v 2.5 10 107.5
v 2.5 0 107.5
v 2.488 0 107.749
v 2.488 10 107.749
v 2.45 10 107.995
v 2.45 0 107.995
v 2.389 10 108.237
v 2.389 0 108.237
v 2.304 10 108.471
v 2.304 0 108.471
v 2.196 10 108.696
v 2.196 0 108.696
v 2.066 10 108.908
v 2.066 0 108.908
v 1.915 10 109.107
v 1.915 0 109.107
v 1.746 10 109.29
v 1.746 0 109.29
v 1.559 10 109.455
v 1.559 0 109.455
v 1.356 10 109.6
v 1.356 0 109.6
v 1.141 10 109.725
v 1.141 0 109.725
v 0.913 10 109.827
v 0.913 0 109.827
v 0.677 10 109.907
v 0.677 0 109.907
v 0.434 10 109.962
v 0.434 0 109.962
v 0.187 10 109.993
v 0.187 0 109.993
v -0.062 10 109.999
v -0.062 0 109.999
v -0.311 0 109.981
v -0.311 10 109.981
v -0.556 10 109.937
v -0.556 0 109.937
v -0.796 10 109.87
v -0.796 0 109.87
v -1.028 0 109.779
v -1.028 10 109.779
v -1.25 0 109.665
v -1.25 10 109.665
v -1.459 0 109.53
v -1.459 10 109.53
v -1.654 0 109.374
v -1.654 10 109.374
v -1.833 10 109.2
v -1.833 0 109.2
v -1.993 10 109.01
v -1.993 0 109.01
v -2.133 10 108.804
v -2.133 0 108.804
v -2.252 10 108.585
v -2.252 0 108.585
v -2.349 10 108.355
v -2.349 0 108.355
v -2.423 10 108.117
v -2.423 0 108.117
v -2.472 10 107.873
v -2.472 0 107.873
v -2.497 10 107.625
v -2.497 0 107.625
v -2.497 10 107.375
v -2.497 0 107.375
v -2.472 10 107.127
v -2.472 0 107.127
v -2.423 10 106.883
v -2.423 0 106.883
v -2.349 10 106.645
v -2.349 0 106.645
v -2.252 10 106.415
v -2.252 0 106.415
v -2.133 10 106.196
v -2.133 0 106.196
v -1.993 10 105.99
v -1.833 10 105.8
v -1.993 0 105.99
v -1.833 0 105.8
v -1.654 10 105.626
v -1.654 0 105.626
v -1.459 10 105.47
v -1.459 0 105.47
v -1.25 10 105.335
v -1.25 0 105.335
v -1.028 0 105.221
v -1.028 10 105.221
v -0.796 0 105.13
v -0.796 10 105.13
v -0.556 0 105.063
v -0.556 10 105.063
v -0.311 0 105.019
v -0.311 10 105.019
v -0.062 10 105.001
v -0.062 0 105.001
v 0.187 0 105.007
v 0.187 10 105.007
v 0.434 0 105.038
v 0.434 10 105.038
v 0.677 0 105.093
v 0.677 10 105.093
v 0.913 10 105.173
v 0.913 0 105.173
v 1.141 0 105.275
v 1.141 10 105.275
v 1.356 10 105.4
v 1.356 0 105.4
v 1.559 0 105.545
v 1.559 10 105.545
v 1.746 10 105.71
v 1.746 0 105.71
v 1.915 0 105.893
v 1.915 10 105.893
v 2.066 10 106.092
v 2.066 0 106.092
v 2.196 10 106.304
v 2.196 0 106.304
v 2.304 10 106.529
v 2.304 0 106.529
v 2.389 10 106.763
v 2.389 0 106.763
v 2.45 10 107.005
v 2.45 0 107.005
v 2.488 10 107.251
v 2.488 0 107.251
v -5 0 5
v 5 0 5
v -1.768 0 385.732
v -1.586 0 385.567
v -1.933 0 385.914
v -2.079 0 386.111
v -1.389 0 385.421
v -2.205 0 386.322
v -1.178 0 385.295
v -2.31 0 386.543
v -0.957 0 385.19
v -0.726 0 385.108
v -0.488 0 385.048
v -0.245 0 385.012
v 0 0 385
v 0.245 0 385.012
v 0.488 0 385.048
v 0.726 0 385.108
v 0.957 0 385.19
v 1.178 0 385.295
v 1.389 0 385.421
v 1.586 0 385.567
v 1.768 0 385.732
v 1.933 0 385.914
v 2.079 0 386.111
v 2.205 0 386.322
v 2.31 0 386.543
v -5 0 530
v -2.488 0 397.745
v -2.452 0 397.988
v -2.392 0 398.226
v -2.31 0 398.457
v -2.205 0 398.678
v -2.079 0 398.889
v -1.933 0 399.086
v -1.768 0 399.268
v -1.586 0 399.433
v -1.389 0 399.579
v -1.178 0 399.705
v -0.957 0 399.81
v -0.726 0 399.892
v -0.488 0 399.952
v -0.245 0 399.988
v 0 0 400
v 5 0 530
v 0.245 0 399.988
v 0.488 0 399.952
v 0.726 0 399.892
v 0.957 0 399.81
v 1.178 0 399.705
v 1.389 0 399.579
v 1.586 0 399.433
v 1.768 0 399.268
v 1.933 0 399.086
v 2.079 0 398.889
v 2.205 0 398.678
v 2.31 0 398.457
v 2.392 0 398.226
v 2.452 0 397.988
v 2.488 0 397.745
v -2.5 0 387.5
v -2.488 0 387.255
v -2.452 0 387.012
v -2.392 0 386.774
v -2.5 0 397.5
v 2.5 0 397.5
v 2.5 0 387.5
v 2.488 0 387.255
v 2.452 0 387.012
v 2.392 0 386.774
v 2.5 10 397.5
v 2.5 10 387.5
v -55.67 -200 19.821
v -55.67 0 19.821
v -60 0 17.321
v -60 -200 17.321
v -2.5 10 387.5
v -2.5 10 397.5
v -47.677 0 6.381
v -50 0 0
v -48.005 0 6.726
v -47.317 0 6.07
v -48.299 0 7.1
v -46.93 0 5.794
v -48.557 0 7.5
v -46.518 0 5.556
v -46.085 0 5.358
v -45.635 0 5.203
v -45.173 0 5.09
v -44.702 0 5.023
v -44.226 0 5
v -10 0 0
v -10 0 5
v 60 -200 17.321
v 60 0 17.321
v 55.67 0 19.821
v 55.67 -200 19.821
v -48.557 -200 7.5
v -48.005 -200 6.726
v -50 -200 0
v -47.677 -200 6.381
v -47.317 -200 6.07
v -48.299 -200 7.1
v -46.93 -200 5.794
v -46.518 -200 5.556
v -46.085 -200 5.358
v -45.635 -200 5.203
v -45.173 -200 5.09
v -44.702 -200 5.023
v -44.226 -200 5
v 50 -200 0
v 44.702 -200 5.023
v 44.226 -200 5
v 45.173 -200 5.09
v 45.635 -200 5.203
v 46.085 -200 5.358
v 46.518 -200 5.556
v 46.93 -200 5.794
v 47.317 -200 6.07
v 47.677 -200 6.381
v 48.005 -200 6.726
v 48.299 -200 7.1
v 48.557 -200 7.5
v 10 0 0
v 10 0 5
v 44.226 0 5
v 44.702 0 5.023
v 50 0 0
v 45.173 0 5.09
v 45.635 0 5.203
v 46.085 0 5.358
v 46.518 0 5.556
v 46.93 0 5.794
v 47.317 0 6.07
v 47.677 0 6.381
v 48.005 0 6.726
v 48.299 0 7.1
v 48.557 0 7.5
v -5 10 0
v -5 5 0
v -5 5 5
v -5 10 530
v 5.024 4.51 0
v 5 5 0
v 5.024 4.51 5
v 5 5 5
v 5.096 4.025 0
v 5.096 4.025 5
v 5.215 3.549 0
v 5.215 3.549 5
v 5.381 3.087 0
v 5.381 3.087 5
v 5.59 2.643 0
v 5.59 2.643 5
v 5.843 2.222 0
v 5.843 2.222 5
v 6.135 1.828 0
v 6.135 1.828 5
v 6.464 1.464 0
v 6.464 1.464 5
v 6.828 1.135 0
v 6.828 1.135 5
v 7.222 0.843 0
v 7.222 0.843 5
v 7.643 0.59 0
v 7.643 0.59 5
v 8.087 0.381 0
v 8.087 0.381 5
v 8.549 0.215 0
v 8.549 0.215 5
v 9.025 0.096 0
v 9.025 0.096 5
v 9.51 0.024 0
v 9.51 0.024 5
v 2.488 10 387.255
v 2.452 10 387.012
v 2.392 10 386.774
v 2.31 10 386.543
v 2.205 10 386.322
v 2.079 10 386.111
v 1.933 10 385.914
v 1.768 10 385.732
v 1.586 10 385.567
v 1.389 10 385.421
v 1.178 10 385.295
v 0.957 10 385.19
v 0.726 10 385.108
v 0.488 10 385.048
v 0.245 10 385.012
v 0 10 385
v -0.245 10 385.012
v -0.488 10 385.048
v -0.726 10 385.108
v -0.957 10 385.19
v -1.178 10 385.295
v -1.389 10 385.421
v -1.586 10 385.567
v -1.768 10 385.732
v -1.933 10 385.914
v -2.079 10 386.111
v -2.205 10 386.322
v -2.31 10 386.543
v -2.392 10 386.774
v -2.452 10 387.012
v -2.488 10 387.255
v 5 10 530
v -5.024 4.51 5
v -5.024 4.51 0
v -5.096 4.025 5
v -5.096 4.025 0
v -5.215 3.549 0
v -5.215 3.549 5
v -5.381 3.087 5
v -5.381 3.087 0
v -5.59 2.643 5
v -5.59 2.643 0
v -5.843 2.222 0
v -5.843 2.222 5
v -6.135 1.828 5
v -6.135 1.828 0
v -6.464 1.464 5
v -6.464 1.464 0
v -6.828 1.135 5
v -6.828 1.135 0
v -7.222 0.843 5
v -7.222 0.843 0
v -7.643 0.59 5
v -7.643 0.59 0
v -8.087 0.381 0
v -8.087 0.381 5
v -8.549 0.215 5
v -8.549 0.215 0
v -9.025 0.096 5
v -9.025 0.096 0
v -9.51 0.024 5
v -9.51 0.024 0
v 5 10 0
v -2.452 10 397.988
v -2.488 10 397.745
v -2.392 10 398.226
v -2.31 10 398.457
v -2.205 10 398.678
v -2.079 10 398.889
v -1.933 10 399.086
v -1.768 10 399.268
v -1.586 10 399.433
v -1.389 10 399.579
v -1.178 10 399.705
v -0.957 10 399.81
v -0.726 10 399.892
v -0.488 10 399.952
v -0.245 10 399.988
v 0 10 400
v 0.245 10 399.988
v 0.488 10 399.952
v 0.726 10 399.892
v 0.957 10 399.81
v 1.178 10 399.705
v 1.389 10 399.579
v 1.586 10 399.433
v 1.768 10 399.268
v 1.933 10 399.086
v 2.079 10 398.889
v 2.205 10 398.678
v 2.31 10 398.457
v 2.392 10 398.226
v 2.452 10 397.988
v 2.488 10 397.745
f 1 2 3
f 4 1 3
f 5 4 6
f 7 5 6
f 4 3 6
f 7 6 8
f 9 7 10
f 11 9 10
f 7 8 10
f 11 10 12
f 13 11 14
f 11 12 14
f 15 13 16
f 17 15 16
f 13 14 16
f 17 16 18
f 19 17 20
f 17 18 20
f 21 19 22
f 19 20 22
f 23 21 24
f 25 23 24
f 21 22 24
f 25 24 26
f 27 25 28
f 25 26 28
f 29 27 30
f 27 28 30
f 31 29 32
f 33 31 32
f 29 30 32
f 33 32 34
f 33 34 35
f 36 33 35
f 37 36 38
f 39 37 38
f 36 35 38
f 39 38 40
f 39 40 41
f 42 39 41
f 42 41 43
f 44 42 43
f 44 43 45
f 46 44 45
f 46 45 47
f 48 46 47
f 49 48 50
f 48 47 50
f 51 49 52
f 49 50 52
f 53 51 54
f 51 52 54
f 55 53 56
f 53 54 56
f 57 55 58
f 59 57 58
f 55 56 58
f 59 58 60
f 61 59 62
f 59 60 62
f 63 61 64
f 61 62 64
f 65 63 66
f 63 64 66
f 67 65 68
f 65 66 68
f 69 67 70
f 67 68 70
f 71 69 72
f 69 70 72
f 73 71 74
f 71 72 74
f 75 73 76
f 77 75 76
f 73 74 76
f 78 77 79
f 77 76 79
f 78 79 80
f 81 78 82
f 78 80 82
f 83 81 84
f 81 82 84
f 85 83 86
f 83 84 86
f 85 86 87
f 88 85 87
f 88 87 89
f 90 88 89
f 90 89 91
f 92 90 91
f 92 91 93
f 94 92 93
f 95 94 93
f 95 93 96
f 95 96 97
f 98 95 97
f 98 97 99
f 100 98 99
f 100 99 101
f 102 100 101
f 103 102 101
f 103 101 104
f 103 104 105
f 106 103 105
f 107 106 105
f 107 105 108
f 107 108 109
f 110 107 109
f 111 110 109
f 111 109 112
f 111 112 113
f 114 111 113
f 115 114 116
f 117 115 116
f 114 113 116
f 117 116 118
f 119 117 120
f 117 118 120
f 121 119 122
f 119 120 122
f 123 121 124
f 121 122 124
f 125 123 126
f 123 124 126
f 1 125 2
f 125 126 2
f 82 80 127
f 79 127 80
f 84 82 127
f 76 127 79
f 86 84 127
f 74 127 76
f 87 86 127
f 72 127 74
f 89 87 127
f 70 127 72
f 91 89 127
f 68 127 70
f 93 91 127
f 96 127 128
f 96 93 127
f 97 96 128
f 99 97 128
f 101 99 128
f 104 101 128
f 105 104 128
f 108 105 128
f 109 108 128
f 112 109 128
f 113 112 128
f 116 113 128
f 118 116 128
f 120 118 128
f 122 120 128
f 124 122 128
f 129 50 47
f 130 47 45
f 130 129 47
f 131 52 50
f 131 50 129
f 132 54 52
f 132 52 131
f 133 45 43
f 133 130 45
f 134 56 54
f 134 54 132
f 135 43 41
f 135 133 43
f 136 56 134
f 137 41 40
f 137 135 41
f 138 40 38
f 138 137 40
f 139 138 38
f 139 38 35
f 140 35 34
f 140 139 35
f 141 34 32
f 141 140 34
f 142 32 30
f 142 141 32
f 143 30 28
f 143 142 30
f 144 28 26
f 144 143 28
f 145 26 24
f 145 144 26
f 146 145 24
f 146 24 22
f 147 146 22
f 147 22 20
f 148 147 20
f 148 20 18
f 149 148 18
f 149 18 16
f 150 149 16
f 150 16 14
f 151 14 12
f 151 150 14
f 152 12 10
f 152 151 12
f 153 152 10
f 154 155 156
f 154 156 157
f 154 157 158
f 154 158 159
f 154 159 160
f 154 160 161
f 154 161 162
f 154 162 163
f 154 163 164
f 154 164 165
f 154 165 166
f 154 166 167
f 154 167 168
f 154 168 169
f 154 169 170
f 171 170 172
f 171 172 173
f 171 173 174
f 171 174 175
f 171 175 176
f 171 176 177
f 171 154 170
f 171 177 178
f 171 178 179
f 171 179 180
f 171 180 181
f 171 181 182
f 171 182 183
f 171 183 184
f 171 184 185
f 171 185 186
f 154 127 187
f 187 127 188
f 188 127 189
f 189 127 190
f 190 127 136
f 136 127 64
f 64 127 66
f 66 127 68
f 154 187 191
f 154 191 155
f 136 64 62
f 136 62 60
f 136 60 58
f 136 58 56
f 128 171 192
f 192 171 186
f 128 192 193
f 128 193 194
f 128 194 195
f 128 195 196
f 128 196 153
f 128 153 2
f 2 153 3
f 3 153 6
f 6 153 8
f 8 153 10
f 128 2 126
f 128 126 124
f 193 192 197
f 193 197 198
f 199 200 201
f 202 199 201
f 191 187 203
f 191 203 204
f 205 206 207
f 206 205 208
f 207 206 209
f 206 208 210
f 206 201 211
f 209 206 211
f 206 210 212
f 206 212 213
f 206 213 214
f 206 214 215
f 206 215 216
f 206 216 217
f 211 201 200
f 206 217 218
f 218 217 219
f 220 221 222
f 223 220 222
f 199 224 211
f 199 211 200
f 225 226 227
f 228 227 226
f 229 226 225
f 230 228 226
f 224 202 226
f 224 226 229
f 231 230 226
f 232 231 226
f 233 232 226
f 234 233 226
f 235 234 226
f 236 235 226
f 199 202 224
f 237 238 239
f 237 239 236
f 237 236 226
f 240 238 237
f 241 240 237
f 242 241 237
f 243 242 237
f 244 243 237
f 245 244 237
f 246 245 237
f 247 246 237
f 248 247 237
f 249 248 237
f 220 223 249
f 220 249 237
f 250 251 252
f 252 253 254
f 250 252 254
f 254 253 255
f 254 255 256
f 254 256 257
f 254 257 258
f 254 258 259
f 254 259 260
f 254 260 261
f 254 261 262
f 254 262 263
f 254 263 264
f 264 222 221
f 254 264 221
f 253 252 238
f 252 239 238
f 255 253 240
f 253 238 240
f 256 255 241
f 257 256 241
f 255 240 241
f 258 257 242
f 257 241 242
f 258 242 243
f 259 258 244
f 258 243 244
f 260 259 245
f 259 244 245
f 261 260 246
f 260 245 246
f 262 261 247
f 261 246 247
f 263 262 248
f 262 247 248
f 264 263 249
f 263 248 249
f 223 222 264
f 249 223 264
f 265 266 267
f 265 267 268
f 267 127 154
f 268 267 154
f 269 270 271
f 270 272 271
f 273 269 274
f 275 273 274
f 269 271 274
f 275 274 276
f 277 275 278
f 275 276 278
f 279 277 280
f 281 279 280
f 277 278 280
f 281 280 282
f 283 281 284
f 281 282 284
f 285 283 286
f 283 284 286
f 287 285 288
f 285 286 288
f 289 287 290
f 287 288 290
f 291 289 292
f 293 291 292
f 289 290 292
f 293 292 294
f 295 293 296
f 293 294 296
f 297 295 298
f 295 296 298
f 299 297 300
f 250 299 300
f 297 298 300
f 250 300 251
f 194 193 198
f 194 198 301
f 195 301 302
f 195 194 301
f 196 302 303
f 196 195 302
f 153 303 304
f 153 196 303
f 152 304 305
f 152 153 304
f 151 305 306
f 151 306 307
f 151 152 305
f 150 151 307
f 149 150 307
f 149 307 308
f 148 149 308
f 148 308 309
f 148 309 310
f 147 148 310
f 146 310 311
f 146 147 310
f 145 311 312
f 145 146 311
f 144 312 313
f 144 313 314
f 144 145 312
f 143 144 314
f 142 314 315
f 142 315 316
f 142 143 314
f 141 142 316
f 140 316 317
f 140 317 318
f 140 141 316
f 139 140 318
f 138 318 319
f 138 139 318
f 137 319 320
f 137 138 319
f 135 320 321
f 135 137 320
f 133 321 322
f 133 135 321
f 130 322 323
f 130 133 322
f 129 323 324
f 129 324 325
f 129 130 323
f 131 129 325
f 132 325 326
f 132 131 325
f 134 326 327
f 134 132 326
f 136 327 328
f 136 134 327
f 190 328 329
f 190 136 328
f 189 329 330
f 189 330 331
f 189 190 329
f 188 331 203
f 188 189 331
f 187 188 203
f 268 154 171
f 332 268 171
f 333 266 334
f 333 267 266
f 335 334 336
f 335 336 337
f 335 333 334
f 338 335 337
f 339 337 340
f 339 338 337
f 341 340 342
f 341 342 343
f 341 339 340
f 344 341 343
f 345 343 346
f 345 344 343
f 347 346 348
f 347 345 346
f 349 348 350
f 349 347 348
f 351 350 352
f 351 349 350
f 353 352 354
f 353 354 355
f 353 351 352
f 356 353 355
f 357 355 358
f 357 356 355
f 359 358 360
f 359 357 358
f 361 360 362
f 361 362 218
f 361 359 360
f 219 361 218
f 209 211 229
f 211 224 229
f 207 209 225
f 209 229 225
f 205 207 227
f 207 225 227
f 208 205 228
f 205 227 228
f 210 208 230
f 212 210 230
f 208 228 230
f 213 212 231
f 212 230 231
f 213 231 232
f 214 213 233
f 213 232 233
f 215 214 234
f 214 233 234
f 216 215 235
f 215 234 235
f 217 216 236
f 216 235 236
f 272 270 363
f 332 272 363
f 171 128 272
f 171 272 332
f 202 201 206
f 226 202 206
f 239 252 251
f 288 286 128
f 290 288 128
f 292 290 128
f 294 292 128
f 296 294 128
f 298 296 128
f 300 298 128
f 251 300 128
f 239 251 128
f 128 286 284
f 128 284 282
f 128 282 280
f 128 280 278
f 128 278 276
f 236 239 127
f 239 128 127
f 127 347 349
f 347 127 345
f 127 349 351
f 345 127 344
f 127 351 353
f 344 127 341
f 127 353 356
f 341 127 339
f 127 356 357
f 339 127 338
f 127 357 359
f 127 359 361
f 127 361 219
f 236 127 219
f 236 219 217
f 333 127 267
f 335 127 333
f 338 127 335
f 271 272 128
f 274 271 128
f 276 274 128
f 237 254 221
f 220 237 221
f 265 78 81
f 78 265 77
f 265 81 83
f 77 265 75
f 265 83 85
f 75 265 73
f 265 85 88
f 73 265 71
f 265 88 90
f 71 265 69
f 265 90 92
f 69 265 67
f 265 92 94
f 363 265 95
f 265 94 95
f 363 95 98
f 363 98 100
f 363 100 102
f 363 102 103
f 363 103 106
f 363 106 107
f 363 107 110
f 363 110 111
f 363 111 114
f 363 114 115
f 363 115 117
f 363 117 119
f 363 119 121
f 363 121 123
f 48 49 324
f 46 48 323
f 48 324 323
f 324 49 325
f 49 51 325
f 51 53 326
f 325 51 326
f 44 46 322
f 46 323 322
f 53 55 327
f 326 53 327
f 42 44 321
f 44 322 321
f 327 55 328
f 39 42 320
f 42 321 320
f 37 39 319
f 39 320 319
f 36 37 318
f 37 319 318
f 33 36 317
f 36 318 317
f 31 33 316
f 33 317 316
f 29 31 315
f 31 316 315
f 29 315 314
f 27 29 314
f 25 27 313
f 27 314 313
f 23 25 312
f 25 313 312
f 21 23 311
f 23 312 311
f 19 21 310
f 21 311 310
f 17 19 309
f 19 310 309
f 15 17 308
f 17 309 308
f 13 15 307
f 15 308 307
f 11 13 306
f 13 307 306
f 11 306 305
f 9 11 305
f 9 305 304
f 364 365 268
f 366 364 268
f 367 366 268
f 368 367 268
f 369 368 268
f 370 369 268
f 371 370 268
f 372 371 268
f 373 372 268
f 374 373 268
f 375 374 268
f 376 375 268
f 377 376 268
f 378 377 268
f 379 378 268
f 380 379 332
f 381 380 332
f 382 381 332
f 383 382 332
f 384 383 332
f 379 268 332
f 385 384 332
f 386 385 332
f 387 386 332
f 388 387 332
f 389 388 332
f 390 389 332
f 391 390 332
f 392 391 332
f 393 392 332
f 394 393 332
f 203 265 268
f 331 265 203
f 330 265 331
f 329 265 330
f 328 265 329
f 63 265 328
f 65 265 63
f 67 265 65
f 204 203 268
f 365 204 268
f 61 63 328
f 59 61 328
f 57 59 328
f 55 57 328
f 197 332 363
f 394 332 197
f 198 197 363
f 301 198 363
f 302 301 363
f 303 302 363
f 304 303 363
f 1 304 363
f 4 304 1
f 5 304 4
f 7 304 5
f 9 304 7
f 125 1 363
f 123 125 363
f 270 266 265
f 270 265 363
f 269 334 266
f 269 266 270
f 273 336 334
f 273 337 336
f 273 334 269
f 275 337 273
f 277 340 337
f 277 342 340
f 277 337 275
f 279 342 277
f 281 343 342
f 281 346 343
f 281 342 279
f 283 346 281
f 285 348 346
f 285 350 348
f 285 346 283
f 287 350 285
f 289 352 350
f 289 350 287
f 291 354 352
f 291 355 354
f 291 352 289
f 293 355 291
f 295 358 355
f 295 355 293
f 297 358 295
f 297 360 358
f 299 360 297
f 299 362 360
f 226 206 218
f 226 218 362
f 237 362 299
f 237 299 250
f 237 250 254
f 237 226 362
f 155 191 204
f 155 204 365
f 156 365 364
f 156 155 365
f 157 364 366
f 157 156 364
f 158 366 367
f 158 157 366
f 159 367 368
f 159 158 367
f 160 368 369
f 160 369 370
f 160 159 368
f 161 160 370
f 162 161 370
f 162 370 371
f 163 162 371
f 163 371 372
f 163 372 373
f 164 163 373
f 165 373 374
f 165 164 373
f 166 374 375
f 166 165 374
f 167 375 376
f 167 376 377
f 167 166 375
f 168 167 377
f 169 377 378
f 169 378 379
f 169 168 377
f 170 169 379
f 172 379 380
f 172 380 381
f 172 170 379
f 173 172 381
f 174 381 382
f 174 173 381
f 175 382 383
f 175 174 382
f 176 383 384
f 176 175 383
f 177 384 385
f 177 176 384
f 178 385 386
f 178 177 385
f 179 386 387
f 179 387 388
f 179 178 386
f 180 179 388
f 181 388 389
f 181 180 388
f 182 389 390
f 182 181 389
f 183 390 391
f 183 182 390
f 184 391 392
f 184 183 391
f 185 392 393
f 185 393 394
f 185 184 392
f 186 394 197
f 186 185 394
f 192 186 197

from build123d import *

# Parameters (mm, degrees)
F1_DEPTH = 200
F2_W     = 10
F2_H     = 530
F2_R     = 2.5
F3_DEPTH = 10
F4_R     = 5


with BuildPart() as f1:
    # F0 (on Front) → F1 (new body)
    with BuildSketch(Plane.XZ):
        Polygon((-60, 17.3205080757), (-50, 0), (0, 0), (50, 0), (60, 17.3205080757), (55.6698729811, 19.8205080757), (47.1132486541, 5), (0, 5), (-47.1132486541, 5), (-55.6698729811, 19.8205080757), align=None)
    extrude(amount=F1_DEPTH)

    # F2 (on Front) → F3 (join)
    with BuildSketch(Plane.XZ):
        with Locations((0, 265)):
            Rectangle(F2_W, F2_H)
        with Locations((0, 107.5)):
            Circle(F2_R, mode=Mode.SUBTRACT)
        with BuildLine():
            ThreePointArc((-2.5, 397.5), (0, 400), (2.5, 397.5))
            Line((2.5, 397.5), (2.5, 387.5))
            ThreePointArc((2.5, 387.5), (0, 385), (-2.5, 387.5))
            Line((-2.5, 387.5), (-2.5, 397.5))
        make_face(mode=Mode.SUBTRACT)
    extrude(amount=-F3_DEPTH)

    # F4
    f4_edges = [f1.edges().sort_by_distance(p)[0] for p in [
        (47.113249, -100, 5),
        (-47.113249, -100, 5),
        (5, 0, 2.5),
        (-5, 0, 2.5),
    ]]
    fillet(f4_edges, radius=F4_R)


solid = f1.part
